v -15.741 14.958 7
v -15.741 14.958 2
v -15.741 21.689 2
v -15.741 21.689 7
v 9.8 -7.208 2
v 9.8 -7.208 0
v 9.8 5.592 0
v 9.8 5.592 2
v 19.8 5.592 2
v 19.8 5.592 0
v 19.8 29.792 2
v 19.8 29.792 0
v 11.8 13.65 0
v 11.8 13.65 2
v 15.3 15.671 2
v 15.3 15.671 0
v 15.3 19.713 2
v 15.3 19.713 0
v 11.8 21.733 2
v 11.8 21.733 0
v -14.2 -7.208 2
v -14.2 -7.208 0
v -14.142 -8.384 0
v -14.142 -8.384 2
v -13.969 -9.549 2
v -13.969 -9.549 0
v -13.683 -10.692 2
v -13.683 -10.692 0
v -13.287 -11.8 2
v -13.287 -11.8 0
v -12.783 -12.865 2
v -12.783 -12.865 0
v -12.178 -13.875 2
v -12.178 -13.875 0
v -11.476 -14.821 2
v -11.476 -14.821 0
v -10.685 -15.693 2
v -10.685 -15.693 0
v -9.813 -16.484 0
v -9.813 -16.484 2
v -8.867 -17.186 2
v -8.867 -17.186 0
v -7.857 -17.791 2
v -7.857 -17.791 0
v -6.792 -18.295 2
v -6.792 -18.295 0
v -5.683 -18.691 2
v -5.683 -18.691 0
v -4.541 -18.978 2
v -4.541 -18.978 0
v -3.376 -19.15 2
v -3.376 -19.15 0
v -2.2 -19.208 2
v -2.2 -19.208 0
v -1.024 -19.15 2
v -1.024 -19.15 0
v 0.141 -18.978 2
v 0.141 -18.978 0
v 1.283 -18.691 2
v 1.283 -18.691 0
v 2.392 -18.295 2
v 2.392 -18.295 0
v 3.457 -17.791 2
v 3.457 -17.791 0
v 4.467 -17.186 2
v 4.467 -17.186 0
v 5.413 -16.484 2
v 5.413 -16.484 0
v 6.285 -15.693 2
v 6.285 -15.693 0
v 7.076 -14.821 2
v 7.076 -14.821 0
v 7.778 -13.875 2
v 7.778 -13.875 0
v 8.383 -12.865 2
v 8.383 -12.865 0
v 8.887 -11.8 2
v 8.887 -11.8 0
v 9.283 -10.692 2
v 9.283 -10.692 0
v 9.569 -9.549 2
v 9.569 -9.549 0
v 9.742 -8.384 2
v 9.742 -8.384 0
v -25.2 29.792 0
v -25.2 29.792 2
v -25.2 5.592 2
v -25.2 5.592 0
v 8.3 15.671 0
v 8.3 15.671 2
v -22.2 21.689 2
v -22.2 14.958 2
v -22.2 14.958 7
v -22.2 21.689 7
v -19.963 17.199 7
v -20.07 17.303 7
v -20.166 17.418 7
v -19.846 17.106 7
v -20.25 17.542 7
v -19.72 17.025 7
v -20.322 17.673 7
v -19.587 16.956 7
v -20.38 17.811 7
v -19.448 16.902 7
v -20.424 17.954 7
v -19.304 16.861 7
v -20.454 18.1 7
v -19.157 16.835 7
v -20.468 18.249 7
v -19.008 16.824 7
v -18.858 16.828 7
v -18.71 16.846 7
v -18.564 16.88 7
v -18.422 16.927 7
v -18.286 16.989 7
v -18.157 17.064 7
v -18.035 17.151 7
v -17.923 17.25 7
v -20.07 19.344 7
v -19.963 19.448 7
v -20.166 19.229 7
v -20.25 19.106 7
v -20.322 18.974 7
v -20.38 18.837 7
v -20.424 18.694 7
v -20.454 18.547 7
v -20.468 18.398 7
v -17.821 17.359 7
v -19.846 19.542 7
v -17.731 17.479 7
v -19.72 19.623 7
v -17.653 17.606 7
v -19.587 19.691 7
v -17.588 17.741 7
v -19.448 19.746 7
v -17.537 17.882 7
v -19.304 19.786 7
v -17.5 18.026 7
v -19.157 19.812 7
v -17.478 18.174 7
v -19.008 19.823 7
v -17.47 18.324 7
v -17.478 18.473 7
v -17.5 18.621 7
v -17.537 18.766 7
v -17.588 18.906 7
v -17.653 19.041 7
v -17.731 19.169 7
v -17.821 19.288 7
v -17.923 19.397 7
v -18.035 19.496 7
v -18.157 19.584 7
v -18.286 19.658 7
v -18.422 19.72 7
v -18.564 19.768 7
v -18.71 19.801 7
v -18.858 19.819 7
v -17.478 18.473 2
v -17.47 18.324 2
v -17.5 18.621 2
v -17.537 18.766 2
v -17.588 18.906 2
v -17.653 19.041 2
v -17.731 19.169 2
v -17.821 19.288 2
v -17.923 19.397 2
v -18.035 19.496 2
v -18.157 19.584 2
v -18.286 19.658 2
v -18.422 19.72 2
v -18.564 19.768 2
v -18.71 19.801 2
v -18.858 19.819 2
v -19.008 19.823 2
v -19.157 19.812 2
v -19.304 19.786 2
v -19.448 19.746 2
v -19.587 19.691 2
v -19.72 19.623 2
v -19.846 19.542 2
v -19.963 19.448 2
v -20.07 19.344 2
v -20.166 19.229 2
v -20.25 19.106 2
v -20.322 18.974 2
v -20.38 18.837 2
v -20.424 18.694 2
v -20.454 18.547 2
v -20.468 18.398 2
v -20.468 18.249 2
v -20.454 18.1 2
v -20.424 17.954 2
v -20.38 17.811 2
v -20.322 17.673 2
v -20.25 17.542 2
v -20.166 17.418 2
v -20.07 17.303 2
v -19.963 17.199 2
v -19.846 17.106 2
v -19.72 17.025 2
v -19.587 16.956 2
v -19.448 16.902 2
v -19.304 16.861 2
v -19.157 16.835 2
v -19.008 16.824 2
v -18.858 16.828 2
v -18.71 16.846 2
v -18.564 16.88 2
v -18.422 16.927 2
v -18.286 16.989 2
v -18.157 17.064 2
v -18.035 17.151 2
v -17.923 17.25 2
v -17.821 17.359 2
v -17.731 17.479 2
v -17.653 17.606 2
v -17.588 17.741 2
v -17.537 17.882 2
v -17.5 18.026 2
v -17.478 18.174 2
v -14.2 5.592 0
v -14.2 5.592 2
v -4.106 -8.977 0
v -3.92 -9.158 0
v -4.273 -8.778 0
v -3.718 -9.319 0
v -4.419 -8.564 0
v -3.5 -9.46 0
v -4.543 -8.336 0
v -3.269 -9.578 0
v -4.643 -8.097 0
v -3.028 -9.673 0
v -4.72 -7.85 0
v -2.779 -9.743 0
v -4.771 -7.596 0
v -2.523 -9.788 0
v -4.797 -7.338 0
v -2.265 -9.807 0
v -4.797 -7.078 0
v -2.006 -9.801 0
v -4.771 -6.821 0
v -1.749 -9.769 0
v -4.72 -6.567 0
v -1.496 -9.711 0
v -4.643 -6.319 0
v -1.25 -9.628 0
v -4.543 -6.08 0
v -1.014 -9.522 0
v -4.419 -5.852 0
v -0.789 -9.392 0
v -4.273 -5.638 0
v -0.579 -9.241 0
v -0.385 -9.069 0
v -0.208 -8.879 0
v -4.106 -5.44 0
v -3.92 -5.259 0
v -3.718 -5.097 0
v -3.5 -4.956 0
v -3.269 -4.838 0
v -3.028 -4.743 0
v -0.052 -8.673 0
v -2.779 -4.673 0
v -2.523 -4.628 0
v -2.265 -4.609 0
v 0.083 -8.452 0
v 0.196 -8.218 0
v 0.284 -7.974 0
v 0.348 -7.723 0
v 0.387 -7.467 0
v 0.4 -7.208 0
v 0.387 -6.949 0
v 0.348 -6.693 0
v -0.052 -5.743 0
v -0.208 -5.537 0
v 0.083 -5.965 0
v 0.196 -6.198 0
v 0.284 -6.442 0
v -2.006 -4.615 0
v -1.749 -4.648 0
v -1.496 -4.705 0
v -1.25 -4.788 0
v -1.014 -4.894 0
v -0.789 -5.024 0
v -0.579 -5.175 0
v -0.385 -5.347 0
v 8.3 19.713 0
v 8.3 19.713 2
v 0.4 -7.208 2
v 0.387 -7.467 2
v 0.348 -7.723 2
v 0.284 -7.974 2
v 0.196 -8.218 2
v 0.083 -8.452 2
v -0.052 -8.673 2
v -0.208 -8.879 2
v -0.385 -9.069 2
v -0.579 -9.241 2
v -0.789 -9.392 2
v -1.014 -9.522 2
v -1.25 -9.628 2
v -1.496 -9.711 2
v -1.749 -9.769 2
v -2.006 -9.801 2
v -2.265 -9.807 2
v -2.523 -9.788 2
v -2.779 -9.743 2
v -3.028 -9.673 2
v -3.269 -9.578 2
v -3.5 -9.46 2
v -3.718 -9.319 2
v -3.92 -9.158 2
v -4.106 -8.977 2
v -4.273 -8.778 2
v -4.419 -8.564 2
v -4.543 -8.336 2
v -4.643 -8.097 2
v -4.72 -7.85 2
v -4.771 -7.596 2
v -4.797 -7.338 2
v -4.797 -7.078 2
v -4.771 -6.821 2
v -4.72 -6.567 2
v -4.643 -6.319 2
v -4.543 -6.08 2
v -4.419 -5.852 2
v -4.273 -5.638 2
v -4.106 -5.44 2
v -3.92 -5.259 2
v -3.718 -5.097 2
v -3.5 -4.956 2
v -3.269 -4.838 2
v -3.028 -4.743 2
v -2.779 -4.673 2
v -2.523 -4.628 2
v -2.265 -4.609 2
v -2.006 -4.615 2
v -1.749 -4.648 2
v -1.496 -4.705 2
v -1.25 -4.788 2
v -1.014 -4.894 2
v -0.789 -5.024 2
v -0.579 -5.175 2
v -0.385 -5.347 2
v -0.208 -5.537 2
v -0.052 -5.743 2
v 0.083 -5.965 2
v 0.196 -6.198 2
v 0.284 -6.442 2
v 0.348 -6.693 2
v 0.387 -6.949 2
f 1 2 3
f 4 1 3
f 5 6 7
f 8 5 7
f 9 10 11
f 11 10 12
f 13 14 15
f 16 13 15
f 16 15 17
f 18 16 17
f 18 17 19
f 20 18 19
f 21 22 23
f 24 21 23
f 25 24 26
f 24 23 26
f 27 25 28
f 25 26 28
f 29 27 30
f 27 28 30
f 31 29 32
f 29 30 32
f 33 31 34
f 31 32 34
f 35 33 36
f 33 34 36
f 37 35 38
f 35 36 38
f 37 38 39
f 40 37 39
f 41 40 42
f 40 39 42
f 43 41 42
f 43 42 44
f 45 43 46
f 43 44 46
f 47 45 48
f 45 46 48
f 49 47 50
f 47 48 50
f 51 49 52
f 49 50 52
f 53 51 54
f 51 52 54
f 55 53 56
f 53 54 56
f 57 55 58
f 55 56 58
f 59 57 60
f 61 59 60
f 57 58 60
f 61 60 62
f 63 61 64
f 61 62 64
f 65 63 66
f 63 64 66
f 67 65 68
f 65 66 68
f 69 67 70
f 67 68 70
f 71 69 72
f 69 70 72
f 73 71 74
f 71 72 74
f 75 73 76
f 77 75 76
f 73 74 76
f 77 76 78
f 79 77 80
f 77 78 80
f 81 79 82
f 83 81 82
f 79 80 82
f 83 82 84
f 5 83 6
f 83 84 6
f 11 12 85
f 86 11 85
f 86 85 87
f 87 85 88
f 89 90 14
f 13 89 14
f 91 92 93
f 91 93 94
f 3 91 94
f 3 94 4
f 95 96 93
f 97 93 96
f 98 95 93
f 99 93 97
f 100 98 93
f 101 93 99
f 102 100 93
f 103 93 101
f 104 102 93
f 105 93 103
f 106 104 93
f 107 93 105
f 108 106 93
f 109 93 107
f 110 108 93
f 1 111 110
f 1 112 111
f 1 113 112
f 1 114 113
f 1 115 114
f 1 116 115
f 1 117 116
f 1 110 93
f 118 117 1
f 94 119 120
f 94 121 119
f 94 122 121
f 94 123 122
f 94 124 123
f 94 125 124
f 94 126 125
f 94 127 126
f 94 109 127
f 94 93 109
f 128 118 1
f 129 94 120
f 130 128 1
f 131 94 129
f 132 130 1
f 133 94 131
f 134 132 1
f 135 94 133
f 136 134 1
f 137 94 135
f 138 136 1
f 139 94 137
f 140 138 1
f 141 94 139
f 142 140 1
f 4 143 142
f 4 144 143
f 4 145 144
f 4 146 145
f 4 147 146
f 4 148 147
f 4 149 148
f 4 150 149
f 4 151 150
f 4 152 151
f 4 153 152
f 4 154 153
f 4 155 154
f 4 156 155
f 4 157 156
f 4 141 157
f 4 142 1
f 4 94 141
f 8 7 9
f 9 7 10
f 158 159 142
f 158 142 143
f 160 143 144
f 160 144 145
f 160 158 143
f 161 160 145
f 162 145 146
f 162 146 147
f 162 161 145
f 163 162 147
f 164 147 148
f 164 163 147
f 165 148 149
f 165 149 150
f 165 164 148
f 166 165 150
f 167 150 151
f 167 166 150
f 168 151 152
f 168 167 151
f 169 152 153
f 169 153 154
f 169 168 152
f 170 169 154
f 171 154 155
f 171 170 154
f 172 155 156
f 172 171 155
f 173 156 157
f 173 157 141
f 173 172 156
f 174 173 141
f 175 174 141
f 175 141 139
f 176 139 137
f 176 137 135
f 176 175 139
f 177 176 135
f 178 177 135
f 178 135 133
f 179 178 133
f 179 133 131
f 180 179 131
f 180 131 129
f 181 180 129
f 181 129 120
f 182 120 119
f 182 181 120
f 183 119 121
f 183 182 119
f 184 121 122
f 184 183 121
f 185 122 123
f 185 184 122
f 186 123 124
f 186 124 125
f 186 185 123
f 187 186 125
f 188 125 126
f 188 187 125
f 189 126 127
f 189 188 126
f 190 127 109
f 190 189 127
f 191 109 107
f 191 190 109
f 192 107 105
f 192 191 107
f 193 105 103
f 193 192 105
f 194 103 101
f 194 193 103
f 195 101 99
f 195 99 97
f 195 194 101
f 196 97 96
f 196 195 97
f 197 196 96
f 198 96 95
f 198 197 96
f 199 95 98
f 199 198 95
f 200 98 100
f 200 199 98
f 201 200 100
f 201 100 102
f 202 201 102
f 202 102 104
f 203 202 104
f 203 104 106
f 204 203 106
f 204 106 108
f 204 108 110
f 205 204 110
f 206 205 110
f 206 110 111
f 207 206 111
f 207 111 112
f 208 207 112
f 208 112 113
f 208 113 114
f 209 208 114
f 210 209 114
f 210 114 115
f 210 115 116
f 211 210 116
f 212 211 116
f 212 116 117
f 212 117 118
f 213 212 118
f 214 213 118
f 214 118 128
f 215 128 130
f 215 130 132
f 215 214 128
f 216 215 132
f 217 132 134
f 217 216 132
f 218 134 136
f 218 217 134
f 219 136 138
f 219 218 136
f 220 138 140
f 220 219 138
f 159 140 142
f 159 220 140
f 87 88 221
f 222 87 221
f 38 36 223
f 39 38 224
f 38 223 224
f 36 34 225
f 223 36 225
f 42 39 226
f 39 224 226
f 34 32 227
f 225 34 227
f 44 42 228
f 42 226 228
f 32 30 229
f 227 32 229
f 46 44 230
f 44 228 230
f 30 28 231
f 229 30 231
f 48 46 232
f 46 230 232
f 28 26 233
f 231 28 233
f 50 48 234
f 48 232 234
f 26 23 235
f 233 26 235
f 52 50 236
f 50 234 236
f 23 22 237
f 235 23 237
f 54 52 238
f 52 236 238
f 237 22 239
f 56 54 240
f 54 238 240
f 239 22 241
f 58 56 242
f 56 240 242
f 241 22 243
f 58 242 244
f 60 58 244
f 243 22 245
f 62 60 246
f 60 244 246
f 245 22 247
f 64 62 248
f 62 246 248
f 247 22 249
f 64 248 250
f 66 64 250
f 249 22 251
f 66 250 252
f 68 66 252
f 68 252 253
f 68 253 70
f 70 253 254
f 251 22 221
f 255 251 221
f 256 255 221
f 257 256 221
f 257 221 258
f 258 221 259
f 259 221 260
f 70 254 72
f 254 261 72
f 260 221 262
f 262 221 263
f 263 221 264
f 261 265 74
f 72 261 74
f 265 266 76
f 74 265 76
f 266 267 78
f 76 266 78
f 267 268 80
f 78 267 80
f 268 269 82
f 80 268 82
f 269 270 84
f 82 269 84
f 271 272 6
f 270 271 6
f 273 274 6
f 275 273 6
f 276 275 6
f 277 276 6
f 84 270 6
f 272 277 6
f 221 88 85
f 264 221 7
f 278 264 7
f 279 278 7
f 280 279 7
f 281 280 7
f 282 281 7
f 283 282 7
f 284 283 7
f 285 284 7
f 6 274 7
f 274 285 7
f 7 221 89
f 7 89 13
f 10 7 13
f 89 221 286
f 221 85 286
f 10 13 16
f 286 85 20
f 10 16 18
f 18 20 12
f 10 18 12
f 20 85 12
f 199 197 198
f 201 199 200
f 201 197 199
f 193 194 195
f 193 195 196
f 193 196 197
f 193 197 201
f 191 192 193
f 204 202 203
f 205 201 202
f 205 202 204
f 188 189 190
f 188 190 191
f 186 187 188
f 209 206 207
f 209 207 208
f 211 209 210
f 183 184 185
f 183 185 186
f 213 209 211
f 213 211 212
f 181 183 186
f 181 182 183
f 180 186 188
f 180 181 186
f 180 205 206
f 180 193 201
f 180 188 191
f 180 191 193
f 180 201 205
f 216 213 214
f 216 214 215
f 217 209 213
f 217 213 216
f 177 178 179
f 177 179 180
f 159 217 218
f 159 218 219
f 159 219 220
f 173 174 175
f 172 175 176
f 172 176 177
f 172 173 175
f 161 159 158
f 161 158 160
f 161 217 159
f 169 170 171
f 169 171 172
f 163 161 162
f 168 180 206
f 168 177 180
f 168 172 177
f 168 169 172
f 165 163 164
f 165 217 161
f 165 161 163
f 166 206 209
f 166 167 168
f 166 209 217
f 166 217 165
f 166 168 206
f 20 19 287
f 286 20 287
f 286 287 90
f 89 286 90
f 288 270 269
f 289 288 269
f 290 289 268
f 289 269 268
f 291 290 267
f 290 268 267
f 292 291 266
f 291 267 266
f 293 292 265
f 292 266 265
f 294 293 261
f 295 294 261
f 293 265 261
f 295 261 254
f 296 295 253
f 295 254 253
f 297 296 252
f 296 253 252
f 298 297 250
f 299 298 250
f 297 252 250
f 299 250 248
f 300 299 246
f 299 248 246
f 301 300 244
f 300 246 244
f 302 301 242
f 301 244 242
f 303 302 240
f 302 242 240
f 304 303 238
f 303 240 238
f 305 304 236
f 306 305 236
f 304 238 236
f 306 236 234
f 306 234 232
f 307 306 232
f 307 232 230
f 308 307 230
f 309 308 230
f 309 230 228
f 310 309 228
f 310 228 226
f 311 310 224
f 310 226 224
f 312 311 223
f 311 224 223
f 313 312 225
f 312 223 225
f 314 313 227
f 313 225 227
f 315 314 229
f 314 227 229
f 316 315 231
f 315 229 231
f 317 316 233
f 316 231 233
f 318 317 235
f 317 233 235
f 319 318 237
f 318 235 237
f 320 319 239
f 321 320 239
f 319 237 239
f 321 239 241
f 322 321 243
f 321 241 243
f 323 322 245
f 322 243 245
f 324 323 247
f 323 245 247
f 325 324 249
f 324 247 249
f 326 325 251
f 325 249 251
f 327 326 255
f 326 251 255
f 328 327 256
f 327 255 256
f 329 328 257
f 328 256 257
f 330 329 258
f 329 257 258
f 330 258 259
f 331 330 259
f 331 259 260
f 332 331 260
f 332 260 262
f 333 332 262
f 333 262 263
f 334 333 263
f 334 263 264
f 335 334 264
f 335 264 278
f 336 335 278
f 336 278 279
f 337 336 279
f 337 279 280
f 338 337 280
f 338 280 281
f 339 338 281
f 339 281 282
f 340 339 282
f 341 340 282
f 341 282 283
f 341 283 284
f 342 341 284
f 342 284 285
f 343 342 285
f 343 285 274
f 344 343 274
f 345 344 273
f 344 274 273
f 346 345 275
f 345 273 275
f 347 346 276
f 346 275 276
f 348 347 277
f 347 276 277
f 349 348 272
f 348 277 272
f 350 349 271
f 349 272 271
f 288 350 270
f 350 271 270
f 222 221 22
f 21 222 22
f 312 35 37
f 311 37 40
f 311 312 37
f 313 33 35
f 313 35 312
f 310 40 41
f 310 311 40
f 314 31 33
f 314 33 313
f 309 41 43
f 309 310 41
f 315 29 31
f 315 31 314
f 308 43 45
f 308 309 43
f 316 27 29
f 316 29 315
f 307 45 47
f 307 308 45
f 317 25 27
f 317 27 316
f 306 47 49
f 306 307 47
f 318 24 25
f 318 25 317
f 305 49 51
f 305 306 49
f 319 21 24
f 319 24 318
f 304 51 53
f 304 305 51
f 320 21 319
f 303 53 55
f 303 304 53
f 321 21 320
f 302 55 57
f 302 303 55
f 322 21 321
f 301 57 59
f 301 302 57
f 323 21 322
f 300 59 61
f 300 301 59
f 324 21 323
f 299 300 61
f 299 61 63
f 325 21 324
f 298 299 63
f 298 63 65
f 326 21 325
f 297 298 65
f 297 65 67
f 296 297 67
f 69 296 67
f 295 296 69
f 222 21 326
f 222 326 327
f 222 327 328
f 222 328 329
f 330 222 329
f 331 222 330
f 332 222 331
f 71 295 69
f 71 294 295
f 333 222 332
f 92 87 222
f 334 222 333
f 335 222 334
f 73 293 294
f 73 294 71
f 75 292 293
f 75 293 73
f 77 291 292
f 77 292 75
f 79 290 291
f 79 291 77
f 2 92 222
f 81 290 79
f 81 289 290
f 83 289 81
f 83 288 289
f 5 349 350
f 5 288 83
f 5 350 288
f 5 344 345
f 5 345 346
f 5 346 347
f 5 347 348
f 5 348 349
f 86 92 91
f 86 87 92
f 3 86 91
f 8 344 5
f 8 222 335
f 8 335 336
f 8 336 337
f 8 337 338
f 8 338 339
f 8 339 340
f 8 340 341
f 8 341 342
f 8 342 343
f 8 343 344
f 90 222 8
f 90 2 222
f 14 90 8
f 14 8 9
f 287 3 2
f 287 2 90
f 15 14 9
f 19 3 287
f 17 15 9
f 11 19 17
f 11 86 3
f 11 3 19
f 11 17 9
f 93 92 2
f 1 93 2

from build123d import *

# Parameters (mm, degrees)
F1_DEPTH = 2
F2_W     = 6.4592821483
F2_H     = 6.7308258385
F2_R     = 1.5
F3_DEPTH = 5
F4_R     = 1.5
F5_DEPTH = 2


with BuildPart() as f1:
    # F0 (on Top) → F1 (new body)
    with BuildSketch(Plane.XY):
        Polygon((19.8, 29.7919024055), (-25.2, 29.7919024055), (-25.2, 5.5919024055), (-14.2, 5.5919024055), (9.8, 5.5919024055), (19.8, 5.5919024055), align=None)
        with BuildLine():
            Line((9.8, 5.5919024055), (-14.2, 5.5919024055))
            Line((-14.2, 5.5919024055), (-14.2, -7.2080975945))
            Line((-14.2, -7.2080975945), (-4.8, -7.2080975945))
            ThreePointArc((-4.8, -7.2080975945), (-2.2, -4.6080975945), (0.4, -7.2080975945))
            Line((0.4, -7.2080975945), (9.8, -7.2080975945))
            Line((9.8, -7.2080975945), (9.8, 5.5919024055))
        make_face()
        with BuildLine():
            Line((-4.8, -7.2080975945), (-14.2, -7.2080975945))
            ThreePointArc((-14.2, -7.2080975945), (-2.2, -19.2080975945), (9.8, -7.2080975945))
            Line((9.8, -7.2080975945), (0.4, -7.2080975945))
            ThreePointArc((0.4, -7.2080975945), (-2.2, -9.8080975945), (-4.8, -7.2080975945))
        make_face()
    extrude(amount=F1_DEPTH)

    # F2 (on face) → F3 (join)
    with BuildSketch(Plane.XY.offset(2)):
        with Locations((-18.9703589258, 18.3236696757)):
            Rectangle(F2_W, F2_H)
        with Locations((-18.9703589258, 18.3236696757)):
            Circle(F2_R, mode=Mode.SUBTRACT)
    extrude(amount=F3_DEPTH)

    # F4 (on face) → F5 (cut, through all)
    with BuildSketch(Plane.XY.offset(2)):
        Polygon((15.3, 15.6711764633), (15.3, 19.7126283476), (11.8, 21.7333542898), (8.3, 19.7126283476), (8.3, 15.6711764633), (11.8, 13.6504505211), align=None)
        with Locations((11.8, 17.6919024055)):
            Circle(F4_R, mode=Mode.SUBTRACT)
        with Locations((11.8, 17.6919024055)):
            Circle(F4_R)
    extrude(amount=-F5_DEPTH, mode=Mode.SUBTRACT)


solid = f1.part
